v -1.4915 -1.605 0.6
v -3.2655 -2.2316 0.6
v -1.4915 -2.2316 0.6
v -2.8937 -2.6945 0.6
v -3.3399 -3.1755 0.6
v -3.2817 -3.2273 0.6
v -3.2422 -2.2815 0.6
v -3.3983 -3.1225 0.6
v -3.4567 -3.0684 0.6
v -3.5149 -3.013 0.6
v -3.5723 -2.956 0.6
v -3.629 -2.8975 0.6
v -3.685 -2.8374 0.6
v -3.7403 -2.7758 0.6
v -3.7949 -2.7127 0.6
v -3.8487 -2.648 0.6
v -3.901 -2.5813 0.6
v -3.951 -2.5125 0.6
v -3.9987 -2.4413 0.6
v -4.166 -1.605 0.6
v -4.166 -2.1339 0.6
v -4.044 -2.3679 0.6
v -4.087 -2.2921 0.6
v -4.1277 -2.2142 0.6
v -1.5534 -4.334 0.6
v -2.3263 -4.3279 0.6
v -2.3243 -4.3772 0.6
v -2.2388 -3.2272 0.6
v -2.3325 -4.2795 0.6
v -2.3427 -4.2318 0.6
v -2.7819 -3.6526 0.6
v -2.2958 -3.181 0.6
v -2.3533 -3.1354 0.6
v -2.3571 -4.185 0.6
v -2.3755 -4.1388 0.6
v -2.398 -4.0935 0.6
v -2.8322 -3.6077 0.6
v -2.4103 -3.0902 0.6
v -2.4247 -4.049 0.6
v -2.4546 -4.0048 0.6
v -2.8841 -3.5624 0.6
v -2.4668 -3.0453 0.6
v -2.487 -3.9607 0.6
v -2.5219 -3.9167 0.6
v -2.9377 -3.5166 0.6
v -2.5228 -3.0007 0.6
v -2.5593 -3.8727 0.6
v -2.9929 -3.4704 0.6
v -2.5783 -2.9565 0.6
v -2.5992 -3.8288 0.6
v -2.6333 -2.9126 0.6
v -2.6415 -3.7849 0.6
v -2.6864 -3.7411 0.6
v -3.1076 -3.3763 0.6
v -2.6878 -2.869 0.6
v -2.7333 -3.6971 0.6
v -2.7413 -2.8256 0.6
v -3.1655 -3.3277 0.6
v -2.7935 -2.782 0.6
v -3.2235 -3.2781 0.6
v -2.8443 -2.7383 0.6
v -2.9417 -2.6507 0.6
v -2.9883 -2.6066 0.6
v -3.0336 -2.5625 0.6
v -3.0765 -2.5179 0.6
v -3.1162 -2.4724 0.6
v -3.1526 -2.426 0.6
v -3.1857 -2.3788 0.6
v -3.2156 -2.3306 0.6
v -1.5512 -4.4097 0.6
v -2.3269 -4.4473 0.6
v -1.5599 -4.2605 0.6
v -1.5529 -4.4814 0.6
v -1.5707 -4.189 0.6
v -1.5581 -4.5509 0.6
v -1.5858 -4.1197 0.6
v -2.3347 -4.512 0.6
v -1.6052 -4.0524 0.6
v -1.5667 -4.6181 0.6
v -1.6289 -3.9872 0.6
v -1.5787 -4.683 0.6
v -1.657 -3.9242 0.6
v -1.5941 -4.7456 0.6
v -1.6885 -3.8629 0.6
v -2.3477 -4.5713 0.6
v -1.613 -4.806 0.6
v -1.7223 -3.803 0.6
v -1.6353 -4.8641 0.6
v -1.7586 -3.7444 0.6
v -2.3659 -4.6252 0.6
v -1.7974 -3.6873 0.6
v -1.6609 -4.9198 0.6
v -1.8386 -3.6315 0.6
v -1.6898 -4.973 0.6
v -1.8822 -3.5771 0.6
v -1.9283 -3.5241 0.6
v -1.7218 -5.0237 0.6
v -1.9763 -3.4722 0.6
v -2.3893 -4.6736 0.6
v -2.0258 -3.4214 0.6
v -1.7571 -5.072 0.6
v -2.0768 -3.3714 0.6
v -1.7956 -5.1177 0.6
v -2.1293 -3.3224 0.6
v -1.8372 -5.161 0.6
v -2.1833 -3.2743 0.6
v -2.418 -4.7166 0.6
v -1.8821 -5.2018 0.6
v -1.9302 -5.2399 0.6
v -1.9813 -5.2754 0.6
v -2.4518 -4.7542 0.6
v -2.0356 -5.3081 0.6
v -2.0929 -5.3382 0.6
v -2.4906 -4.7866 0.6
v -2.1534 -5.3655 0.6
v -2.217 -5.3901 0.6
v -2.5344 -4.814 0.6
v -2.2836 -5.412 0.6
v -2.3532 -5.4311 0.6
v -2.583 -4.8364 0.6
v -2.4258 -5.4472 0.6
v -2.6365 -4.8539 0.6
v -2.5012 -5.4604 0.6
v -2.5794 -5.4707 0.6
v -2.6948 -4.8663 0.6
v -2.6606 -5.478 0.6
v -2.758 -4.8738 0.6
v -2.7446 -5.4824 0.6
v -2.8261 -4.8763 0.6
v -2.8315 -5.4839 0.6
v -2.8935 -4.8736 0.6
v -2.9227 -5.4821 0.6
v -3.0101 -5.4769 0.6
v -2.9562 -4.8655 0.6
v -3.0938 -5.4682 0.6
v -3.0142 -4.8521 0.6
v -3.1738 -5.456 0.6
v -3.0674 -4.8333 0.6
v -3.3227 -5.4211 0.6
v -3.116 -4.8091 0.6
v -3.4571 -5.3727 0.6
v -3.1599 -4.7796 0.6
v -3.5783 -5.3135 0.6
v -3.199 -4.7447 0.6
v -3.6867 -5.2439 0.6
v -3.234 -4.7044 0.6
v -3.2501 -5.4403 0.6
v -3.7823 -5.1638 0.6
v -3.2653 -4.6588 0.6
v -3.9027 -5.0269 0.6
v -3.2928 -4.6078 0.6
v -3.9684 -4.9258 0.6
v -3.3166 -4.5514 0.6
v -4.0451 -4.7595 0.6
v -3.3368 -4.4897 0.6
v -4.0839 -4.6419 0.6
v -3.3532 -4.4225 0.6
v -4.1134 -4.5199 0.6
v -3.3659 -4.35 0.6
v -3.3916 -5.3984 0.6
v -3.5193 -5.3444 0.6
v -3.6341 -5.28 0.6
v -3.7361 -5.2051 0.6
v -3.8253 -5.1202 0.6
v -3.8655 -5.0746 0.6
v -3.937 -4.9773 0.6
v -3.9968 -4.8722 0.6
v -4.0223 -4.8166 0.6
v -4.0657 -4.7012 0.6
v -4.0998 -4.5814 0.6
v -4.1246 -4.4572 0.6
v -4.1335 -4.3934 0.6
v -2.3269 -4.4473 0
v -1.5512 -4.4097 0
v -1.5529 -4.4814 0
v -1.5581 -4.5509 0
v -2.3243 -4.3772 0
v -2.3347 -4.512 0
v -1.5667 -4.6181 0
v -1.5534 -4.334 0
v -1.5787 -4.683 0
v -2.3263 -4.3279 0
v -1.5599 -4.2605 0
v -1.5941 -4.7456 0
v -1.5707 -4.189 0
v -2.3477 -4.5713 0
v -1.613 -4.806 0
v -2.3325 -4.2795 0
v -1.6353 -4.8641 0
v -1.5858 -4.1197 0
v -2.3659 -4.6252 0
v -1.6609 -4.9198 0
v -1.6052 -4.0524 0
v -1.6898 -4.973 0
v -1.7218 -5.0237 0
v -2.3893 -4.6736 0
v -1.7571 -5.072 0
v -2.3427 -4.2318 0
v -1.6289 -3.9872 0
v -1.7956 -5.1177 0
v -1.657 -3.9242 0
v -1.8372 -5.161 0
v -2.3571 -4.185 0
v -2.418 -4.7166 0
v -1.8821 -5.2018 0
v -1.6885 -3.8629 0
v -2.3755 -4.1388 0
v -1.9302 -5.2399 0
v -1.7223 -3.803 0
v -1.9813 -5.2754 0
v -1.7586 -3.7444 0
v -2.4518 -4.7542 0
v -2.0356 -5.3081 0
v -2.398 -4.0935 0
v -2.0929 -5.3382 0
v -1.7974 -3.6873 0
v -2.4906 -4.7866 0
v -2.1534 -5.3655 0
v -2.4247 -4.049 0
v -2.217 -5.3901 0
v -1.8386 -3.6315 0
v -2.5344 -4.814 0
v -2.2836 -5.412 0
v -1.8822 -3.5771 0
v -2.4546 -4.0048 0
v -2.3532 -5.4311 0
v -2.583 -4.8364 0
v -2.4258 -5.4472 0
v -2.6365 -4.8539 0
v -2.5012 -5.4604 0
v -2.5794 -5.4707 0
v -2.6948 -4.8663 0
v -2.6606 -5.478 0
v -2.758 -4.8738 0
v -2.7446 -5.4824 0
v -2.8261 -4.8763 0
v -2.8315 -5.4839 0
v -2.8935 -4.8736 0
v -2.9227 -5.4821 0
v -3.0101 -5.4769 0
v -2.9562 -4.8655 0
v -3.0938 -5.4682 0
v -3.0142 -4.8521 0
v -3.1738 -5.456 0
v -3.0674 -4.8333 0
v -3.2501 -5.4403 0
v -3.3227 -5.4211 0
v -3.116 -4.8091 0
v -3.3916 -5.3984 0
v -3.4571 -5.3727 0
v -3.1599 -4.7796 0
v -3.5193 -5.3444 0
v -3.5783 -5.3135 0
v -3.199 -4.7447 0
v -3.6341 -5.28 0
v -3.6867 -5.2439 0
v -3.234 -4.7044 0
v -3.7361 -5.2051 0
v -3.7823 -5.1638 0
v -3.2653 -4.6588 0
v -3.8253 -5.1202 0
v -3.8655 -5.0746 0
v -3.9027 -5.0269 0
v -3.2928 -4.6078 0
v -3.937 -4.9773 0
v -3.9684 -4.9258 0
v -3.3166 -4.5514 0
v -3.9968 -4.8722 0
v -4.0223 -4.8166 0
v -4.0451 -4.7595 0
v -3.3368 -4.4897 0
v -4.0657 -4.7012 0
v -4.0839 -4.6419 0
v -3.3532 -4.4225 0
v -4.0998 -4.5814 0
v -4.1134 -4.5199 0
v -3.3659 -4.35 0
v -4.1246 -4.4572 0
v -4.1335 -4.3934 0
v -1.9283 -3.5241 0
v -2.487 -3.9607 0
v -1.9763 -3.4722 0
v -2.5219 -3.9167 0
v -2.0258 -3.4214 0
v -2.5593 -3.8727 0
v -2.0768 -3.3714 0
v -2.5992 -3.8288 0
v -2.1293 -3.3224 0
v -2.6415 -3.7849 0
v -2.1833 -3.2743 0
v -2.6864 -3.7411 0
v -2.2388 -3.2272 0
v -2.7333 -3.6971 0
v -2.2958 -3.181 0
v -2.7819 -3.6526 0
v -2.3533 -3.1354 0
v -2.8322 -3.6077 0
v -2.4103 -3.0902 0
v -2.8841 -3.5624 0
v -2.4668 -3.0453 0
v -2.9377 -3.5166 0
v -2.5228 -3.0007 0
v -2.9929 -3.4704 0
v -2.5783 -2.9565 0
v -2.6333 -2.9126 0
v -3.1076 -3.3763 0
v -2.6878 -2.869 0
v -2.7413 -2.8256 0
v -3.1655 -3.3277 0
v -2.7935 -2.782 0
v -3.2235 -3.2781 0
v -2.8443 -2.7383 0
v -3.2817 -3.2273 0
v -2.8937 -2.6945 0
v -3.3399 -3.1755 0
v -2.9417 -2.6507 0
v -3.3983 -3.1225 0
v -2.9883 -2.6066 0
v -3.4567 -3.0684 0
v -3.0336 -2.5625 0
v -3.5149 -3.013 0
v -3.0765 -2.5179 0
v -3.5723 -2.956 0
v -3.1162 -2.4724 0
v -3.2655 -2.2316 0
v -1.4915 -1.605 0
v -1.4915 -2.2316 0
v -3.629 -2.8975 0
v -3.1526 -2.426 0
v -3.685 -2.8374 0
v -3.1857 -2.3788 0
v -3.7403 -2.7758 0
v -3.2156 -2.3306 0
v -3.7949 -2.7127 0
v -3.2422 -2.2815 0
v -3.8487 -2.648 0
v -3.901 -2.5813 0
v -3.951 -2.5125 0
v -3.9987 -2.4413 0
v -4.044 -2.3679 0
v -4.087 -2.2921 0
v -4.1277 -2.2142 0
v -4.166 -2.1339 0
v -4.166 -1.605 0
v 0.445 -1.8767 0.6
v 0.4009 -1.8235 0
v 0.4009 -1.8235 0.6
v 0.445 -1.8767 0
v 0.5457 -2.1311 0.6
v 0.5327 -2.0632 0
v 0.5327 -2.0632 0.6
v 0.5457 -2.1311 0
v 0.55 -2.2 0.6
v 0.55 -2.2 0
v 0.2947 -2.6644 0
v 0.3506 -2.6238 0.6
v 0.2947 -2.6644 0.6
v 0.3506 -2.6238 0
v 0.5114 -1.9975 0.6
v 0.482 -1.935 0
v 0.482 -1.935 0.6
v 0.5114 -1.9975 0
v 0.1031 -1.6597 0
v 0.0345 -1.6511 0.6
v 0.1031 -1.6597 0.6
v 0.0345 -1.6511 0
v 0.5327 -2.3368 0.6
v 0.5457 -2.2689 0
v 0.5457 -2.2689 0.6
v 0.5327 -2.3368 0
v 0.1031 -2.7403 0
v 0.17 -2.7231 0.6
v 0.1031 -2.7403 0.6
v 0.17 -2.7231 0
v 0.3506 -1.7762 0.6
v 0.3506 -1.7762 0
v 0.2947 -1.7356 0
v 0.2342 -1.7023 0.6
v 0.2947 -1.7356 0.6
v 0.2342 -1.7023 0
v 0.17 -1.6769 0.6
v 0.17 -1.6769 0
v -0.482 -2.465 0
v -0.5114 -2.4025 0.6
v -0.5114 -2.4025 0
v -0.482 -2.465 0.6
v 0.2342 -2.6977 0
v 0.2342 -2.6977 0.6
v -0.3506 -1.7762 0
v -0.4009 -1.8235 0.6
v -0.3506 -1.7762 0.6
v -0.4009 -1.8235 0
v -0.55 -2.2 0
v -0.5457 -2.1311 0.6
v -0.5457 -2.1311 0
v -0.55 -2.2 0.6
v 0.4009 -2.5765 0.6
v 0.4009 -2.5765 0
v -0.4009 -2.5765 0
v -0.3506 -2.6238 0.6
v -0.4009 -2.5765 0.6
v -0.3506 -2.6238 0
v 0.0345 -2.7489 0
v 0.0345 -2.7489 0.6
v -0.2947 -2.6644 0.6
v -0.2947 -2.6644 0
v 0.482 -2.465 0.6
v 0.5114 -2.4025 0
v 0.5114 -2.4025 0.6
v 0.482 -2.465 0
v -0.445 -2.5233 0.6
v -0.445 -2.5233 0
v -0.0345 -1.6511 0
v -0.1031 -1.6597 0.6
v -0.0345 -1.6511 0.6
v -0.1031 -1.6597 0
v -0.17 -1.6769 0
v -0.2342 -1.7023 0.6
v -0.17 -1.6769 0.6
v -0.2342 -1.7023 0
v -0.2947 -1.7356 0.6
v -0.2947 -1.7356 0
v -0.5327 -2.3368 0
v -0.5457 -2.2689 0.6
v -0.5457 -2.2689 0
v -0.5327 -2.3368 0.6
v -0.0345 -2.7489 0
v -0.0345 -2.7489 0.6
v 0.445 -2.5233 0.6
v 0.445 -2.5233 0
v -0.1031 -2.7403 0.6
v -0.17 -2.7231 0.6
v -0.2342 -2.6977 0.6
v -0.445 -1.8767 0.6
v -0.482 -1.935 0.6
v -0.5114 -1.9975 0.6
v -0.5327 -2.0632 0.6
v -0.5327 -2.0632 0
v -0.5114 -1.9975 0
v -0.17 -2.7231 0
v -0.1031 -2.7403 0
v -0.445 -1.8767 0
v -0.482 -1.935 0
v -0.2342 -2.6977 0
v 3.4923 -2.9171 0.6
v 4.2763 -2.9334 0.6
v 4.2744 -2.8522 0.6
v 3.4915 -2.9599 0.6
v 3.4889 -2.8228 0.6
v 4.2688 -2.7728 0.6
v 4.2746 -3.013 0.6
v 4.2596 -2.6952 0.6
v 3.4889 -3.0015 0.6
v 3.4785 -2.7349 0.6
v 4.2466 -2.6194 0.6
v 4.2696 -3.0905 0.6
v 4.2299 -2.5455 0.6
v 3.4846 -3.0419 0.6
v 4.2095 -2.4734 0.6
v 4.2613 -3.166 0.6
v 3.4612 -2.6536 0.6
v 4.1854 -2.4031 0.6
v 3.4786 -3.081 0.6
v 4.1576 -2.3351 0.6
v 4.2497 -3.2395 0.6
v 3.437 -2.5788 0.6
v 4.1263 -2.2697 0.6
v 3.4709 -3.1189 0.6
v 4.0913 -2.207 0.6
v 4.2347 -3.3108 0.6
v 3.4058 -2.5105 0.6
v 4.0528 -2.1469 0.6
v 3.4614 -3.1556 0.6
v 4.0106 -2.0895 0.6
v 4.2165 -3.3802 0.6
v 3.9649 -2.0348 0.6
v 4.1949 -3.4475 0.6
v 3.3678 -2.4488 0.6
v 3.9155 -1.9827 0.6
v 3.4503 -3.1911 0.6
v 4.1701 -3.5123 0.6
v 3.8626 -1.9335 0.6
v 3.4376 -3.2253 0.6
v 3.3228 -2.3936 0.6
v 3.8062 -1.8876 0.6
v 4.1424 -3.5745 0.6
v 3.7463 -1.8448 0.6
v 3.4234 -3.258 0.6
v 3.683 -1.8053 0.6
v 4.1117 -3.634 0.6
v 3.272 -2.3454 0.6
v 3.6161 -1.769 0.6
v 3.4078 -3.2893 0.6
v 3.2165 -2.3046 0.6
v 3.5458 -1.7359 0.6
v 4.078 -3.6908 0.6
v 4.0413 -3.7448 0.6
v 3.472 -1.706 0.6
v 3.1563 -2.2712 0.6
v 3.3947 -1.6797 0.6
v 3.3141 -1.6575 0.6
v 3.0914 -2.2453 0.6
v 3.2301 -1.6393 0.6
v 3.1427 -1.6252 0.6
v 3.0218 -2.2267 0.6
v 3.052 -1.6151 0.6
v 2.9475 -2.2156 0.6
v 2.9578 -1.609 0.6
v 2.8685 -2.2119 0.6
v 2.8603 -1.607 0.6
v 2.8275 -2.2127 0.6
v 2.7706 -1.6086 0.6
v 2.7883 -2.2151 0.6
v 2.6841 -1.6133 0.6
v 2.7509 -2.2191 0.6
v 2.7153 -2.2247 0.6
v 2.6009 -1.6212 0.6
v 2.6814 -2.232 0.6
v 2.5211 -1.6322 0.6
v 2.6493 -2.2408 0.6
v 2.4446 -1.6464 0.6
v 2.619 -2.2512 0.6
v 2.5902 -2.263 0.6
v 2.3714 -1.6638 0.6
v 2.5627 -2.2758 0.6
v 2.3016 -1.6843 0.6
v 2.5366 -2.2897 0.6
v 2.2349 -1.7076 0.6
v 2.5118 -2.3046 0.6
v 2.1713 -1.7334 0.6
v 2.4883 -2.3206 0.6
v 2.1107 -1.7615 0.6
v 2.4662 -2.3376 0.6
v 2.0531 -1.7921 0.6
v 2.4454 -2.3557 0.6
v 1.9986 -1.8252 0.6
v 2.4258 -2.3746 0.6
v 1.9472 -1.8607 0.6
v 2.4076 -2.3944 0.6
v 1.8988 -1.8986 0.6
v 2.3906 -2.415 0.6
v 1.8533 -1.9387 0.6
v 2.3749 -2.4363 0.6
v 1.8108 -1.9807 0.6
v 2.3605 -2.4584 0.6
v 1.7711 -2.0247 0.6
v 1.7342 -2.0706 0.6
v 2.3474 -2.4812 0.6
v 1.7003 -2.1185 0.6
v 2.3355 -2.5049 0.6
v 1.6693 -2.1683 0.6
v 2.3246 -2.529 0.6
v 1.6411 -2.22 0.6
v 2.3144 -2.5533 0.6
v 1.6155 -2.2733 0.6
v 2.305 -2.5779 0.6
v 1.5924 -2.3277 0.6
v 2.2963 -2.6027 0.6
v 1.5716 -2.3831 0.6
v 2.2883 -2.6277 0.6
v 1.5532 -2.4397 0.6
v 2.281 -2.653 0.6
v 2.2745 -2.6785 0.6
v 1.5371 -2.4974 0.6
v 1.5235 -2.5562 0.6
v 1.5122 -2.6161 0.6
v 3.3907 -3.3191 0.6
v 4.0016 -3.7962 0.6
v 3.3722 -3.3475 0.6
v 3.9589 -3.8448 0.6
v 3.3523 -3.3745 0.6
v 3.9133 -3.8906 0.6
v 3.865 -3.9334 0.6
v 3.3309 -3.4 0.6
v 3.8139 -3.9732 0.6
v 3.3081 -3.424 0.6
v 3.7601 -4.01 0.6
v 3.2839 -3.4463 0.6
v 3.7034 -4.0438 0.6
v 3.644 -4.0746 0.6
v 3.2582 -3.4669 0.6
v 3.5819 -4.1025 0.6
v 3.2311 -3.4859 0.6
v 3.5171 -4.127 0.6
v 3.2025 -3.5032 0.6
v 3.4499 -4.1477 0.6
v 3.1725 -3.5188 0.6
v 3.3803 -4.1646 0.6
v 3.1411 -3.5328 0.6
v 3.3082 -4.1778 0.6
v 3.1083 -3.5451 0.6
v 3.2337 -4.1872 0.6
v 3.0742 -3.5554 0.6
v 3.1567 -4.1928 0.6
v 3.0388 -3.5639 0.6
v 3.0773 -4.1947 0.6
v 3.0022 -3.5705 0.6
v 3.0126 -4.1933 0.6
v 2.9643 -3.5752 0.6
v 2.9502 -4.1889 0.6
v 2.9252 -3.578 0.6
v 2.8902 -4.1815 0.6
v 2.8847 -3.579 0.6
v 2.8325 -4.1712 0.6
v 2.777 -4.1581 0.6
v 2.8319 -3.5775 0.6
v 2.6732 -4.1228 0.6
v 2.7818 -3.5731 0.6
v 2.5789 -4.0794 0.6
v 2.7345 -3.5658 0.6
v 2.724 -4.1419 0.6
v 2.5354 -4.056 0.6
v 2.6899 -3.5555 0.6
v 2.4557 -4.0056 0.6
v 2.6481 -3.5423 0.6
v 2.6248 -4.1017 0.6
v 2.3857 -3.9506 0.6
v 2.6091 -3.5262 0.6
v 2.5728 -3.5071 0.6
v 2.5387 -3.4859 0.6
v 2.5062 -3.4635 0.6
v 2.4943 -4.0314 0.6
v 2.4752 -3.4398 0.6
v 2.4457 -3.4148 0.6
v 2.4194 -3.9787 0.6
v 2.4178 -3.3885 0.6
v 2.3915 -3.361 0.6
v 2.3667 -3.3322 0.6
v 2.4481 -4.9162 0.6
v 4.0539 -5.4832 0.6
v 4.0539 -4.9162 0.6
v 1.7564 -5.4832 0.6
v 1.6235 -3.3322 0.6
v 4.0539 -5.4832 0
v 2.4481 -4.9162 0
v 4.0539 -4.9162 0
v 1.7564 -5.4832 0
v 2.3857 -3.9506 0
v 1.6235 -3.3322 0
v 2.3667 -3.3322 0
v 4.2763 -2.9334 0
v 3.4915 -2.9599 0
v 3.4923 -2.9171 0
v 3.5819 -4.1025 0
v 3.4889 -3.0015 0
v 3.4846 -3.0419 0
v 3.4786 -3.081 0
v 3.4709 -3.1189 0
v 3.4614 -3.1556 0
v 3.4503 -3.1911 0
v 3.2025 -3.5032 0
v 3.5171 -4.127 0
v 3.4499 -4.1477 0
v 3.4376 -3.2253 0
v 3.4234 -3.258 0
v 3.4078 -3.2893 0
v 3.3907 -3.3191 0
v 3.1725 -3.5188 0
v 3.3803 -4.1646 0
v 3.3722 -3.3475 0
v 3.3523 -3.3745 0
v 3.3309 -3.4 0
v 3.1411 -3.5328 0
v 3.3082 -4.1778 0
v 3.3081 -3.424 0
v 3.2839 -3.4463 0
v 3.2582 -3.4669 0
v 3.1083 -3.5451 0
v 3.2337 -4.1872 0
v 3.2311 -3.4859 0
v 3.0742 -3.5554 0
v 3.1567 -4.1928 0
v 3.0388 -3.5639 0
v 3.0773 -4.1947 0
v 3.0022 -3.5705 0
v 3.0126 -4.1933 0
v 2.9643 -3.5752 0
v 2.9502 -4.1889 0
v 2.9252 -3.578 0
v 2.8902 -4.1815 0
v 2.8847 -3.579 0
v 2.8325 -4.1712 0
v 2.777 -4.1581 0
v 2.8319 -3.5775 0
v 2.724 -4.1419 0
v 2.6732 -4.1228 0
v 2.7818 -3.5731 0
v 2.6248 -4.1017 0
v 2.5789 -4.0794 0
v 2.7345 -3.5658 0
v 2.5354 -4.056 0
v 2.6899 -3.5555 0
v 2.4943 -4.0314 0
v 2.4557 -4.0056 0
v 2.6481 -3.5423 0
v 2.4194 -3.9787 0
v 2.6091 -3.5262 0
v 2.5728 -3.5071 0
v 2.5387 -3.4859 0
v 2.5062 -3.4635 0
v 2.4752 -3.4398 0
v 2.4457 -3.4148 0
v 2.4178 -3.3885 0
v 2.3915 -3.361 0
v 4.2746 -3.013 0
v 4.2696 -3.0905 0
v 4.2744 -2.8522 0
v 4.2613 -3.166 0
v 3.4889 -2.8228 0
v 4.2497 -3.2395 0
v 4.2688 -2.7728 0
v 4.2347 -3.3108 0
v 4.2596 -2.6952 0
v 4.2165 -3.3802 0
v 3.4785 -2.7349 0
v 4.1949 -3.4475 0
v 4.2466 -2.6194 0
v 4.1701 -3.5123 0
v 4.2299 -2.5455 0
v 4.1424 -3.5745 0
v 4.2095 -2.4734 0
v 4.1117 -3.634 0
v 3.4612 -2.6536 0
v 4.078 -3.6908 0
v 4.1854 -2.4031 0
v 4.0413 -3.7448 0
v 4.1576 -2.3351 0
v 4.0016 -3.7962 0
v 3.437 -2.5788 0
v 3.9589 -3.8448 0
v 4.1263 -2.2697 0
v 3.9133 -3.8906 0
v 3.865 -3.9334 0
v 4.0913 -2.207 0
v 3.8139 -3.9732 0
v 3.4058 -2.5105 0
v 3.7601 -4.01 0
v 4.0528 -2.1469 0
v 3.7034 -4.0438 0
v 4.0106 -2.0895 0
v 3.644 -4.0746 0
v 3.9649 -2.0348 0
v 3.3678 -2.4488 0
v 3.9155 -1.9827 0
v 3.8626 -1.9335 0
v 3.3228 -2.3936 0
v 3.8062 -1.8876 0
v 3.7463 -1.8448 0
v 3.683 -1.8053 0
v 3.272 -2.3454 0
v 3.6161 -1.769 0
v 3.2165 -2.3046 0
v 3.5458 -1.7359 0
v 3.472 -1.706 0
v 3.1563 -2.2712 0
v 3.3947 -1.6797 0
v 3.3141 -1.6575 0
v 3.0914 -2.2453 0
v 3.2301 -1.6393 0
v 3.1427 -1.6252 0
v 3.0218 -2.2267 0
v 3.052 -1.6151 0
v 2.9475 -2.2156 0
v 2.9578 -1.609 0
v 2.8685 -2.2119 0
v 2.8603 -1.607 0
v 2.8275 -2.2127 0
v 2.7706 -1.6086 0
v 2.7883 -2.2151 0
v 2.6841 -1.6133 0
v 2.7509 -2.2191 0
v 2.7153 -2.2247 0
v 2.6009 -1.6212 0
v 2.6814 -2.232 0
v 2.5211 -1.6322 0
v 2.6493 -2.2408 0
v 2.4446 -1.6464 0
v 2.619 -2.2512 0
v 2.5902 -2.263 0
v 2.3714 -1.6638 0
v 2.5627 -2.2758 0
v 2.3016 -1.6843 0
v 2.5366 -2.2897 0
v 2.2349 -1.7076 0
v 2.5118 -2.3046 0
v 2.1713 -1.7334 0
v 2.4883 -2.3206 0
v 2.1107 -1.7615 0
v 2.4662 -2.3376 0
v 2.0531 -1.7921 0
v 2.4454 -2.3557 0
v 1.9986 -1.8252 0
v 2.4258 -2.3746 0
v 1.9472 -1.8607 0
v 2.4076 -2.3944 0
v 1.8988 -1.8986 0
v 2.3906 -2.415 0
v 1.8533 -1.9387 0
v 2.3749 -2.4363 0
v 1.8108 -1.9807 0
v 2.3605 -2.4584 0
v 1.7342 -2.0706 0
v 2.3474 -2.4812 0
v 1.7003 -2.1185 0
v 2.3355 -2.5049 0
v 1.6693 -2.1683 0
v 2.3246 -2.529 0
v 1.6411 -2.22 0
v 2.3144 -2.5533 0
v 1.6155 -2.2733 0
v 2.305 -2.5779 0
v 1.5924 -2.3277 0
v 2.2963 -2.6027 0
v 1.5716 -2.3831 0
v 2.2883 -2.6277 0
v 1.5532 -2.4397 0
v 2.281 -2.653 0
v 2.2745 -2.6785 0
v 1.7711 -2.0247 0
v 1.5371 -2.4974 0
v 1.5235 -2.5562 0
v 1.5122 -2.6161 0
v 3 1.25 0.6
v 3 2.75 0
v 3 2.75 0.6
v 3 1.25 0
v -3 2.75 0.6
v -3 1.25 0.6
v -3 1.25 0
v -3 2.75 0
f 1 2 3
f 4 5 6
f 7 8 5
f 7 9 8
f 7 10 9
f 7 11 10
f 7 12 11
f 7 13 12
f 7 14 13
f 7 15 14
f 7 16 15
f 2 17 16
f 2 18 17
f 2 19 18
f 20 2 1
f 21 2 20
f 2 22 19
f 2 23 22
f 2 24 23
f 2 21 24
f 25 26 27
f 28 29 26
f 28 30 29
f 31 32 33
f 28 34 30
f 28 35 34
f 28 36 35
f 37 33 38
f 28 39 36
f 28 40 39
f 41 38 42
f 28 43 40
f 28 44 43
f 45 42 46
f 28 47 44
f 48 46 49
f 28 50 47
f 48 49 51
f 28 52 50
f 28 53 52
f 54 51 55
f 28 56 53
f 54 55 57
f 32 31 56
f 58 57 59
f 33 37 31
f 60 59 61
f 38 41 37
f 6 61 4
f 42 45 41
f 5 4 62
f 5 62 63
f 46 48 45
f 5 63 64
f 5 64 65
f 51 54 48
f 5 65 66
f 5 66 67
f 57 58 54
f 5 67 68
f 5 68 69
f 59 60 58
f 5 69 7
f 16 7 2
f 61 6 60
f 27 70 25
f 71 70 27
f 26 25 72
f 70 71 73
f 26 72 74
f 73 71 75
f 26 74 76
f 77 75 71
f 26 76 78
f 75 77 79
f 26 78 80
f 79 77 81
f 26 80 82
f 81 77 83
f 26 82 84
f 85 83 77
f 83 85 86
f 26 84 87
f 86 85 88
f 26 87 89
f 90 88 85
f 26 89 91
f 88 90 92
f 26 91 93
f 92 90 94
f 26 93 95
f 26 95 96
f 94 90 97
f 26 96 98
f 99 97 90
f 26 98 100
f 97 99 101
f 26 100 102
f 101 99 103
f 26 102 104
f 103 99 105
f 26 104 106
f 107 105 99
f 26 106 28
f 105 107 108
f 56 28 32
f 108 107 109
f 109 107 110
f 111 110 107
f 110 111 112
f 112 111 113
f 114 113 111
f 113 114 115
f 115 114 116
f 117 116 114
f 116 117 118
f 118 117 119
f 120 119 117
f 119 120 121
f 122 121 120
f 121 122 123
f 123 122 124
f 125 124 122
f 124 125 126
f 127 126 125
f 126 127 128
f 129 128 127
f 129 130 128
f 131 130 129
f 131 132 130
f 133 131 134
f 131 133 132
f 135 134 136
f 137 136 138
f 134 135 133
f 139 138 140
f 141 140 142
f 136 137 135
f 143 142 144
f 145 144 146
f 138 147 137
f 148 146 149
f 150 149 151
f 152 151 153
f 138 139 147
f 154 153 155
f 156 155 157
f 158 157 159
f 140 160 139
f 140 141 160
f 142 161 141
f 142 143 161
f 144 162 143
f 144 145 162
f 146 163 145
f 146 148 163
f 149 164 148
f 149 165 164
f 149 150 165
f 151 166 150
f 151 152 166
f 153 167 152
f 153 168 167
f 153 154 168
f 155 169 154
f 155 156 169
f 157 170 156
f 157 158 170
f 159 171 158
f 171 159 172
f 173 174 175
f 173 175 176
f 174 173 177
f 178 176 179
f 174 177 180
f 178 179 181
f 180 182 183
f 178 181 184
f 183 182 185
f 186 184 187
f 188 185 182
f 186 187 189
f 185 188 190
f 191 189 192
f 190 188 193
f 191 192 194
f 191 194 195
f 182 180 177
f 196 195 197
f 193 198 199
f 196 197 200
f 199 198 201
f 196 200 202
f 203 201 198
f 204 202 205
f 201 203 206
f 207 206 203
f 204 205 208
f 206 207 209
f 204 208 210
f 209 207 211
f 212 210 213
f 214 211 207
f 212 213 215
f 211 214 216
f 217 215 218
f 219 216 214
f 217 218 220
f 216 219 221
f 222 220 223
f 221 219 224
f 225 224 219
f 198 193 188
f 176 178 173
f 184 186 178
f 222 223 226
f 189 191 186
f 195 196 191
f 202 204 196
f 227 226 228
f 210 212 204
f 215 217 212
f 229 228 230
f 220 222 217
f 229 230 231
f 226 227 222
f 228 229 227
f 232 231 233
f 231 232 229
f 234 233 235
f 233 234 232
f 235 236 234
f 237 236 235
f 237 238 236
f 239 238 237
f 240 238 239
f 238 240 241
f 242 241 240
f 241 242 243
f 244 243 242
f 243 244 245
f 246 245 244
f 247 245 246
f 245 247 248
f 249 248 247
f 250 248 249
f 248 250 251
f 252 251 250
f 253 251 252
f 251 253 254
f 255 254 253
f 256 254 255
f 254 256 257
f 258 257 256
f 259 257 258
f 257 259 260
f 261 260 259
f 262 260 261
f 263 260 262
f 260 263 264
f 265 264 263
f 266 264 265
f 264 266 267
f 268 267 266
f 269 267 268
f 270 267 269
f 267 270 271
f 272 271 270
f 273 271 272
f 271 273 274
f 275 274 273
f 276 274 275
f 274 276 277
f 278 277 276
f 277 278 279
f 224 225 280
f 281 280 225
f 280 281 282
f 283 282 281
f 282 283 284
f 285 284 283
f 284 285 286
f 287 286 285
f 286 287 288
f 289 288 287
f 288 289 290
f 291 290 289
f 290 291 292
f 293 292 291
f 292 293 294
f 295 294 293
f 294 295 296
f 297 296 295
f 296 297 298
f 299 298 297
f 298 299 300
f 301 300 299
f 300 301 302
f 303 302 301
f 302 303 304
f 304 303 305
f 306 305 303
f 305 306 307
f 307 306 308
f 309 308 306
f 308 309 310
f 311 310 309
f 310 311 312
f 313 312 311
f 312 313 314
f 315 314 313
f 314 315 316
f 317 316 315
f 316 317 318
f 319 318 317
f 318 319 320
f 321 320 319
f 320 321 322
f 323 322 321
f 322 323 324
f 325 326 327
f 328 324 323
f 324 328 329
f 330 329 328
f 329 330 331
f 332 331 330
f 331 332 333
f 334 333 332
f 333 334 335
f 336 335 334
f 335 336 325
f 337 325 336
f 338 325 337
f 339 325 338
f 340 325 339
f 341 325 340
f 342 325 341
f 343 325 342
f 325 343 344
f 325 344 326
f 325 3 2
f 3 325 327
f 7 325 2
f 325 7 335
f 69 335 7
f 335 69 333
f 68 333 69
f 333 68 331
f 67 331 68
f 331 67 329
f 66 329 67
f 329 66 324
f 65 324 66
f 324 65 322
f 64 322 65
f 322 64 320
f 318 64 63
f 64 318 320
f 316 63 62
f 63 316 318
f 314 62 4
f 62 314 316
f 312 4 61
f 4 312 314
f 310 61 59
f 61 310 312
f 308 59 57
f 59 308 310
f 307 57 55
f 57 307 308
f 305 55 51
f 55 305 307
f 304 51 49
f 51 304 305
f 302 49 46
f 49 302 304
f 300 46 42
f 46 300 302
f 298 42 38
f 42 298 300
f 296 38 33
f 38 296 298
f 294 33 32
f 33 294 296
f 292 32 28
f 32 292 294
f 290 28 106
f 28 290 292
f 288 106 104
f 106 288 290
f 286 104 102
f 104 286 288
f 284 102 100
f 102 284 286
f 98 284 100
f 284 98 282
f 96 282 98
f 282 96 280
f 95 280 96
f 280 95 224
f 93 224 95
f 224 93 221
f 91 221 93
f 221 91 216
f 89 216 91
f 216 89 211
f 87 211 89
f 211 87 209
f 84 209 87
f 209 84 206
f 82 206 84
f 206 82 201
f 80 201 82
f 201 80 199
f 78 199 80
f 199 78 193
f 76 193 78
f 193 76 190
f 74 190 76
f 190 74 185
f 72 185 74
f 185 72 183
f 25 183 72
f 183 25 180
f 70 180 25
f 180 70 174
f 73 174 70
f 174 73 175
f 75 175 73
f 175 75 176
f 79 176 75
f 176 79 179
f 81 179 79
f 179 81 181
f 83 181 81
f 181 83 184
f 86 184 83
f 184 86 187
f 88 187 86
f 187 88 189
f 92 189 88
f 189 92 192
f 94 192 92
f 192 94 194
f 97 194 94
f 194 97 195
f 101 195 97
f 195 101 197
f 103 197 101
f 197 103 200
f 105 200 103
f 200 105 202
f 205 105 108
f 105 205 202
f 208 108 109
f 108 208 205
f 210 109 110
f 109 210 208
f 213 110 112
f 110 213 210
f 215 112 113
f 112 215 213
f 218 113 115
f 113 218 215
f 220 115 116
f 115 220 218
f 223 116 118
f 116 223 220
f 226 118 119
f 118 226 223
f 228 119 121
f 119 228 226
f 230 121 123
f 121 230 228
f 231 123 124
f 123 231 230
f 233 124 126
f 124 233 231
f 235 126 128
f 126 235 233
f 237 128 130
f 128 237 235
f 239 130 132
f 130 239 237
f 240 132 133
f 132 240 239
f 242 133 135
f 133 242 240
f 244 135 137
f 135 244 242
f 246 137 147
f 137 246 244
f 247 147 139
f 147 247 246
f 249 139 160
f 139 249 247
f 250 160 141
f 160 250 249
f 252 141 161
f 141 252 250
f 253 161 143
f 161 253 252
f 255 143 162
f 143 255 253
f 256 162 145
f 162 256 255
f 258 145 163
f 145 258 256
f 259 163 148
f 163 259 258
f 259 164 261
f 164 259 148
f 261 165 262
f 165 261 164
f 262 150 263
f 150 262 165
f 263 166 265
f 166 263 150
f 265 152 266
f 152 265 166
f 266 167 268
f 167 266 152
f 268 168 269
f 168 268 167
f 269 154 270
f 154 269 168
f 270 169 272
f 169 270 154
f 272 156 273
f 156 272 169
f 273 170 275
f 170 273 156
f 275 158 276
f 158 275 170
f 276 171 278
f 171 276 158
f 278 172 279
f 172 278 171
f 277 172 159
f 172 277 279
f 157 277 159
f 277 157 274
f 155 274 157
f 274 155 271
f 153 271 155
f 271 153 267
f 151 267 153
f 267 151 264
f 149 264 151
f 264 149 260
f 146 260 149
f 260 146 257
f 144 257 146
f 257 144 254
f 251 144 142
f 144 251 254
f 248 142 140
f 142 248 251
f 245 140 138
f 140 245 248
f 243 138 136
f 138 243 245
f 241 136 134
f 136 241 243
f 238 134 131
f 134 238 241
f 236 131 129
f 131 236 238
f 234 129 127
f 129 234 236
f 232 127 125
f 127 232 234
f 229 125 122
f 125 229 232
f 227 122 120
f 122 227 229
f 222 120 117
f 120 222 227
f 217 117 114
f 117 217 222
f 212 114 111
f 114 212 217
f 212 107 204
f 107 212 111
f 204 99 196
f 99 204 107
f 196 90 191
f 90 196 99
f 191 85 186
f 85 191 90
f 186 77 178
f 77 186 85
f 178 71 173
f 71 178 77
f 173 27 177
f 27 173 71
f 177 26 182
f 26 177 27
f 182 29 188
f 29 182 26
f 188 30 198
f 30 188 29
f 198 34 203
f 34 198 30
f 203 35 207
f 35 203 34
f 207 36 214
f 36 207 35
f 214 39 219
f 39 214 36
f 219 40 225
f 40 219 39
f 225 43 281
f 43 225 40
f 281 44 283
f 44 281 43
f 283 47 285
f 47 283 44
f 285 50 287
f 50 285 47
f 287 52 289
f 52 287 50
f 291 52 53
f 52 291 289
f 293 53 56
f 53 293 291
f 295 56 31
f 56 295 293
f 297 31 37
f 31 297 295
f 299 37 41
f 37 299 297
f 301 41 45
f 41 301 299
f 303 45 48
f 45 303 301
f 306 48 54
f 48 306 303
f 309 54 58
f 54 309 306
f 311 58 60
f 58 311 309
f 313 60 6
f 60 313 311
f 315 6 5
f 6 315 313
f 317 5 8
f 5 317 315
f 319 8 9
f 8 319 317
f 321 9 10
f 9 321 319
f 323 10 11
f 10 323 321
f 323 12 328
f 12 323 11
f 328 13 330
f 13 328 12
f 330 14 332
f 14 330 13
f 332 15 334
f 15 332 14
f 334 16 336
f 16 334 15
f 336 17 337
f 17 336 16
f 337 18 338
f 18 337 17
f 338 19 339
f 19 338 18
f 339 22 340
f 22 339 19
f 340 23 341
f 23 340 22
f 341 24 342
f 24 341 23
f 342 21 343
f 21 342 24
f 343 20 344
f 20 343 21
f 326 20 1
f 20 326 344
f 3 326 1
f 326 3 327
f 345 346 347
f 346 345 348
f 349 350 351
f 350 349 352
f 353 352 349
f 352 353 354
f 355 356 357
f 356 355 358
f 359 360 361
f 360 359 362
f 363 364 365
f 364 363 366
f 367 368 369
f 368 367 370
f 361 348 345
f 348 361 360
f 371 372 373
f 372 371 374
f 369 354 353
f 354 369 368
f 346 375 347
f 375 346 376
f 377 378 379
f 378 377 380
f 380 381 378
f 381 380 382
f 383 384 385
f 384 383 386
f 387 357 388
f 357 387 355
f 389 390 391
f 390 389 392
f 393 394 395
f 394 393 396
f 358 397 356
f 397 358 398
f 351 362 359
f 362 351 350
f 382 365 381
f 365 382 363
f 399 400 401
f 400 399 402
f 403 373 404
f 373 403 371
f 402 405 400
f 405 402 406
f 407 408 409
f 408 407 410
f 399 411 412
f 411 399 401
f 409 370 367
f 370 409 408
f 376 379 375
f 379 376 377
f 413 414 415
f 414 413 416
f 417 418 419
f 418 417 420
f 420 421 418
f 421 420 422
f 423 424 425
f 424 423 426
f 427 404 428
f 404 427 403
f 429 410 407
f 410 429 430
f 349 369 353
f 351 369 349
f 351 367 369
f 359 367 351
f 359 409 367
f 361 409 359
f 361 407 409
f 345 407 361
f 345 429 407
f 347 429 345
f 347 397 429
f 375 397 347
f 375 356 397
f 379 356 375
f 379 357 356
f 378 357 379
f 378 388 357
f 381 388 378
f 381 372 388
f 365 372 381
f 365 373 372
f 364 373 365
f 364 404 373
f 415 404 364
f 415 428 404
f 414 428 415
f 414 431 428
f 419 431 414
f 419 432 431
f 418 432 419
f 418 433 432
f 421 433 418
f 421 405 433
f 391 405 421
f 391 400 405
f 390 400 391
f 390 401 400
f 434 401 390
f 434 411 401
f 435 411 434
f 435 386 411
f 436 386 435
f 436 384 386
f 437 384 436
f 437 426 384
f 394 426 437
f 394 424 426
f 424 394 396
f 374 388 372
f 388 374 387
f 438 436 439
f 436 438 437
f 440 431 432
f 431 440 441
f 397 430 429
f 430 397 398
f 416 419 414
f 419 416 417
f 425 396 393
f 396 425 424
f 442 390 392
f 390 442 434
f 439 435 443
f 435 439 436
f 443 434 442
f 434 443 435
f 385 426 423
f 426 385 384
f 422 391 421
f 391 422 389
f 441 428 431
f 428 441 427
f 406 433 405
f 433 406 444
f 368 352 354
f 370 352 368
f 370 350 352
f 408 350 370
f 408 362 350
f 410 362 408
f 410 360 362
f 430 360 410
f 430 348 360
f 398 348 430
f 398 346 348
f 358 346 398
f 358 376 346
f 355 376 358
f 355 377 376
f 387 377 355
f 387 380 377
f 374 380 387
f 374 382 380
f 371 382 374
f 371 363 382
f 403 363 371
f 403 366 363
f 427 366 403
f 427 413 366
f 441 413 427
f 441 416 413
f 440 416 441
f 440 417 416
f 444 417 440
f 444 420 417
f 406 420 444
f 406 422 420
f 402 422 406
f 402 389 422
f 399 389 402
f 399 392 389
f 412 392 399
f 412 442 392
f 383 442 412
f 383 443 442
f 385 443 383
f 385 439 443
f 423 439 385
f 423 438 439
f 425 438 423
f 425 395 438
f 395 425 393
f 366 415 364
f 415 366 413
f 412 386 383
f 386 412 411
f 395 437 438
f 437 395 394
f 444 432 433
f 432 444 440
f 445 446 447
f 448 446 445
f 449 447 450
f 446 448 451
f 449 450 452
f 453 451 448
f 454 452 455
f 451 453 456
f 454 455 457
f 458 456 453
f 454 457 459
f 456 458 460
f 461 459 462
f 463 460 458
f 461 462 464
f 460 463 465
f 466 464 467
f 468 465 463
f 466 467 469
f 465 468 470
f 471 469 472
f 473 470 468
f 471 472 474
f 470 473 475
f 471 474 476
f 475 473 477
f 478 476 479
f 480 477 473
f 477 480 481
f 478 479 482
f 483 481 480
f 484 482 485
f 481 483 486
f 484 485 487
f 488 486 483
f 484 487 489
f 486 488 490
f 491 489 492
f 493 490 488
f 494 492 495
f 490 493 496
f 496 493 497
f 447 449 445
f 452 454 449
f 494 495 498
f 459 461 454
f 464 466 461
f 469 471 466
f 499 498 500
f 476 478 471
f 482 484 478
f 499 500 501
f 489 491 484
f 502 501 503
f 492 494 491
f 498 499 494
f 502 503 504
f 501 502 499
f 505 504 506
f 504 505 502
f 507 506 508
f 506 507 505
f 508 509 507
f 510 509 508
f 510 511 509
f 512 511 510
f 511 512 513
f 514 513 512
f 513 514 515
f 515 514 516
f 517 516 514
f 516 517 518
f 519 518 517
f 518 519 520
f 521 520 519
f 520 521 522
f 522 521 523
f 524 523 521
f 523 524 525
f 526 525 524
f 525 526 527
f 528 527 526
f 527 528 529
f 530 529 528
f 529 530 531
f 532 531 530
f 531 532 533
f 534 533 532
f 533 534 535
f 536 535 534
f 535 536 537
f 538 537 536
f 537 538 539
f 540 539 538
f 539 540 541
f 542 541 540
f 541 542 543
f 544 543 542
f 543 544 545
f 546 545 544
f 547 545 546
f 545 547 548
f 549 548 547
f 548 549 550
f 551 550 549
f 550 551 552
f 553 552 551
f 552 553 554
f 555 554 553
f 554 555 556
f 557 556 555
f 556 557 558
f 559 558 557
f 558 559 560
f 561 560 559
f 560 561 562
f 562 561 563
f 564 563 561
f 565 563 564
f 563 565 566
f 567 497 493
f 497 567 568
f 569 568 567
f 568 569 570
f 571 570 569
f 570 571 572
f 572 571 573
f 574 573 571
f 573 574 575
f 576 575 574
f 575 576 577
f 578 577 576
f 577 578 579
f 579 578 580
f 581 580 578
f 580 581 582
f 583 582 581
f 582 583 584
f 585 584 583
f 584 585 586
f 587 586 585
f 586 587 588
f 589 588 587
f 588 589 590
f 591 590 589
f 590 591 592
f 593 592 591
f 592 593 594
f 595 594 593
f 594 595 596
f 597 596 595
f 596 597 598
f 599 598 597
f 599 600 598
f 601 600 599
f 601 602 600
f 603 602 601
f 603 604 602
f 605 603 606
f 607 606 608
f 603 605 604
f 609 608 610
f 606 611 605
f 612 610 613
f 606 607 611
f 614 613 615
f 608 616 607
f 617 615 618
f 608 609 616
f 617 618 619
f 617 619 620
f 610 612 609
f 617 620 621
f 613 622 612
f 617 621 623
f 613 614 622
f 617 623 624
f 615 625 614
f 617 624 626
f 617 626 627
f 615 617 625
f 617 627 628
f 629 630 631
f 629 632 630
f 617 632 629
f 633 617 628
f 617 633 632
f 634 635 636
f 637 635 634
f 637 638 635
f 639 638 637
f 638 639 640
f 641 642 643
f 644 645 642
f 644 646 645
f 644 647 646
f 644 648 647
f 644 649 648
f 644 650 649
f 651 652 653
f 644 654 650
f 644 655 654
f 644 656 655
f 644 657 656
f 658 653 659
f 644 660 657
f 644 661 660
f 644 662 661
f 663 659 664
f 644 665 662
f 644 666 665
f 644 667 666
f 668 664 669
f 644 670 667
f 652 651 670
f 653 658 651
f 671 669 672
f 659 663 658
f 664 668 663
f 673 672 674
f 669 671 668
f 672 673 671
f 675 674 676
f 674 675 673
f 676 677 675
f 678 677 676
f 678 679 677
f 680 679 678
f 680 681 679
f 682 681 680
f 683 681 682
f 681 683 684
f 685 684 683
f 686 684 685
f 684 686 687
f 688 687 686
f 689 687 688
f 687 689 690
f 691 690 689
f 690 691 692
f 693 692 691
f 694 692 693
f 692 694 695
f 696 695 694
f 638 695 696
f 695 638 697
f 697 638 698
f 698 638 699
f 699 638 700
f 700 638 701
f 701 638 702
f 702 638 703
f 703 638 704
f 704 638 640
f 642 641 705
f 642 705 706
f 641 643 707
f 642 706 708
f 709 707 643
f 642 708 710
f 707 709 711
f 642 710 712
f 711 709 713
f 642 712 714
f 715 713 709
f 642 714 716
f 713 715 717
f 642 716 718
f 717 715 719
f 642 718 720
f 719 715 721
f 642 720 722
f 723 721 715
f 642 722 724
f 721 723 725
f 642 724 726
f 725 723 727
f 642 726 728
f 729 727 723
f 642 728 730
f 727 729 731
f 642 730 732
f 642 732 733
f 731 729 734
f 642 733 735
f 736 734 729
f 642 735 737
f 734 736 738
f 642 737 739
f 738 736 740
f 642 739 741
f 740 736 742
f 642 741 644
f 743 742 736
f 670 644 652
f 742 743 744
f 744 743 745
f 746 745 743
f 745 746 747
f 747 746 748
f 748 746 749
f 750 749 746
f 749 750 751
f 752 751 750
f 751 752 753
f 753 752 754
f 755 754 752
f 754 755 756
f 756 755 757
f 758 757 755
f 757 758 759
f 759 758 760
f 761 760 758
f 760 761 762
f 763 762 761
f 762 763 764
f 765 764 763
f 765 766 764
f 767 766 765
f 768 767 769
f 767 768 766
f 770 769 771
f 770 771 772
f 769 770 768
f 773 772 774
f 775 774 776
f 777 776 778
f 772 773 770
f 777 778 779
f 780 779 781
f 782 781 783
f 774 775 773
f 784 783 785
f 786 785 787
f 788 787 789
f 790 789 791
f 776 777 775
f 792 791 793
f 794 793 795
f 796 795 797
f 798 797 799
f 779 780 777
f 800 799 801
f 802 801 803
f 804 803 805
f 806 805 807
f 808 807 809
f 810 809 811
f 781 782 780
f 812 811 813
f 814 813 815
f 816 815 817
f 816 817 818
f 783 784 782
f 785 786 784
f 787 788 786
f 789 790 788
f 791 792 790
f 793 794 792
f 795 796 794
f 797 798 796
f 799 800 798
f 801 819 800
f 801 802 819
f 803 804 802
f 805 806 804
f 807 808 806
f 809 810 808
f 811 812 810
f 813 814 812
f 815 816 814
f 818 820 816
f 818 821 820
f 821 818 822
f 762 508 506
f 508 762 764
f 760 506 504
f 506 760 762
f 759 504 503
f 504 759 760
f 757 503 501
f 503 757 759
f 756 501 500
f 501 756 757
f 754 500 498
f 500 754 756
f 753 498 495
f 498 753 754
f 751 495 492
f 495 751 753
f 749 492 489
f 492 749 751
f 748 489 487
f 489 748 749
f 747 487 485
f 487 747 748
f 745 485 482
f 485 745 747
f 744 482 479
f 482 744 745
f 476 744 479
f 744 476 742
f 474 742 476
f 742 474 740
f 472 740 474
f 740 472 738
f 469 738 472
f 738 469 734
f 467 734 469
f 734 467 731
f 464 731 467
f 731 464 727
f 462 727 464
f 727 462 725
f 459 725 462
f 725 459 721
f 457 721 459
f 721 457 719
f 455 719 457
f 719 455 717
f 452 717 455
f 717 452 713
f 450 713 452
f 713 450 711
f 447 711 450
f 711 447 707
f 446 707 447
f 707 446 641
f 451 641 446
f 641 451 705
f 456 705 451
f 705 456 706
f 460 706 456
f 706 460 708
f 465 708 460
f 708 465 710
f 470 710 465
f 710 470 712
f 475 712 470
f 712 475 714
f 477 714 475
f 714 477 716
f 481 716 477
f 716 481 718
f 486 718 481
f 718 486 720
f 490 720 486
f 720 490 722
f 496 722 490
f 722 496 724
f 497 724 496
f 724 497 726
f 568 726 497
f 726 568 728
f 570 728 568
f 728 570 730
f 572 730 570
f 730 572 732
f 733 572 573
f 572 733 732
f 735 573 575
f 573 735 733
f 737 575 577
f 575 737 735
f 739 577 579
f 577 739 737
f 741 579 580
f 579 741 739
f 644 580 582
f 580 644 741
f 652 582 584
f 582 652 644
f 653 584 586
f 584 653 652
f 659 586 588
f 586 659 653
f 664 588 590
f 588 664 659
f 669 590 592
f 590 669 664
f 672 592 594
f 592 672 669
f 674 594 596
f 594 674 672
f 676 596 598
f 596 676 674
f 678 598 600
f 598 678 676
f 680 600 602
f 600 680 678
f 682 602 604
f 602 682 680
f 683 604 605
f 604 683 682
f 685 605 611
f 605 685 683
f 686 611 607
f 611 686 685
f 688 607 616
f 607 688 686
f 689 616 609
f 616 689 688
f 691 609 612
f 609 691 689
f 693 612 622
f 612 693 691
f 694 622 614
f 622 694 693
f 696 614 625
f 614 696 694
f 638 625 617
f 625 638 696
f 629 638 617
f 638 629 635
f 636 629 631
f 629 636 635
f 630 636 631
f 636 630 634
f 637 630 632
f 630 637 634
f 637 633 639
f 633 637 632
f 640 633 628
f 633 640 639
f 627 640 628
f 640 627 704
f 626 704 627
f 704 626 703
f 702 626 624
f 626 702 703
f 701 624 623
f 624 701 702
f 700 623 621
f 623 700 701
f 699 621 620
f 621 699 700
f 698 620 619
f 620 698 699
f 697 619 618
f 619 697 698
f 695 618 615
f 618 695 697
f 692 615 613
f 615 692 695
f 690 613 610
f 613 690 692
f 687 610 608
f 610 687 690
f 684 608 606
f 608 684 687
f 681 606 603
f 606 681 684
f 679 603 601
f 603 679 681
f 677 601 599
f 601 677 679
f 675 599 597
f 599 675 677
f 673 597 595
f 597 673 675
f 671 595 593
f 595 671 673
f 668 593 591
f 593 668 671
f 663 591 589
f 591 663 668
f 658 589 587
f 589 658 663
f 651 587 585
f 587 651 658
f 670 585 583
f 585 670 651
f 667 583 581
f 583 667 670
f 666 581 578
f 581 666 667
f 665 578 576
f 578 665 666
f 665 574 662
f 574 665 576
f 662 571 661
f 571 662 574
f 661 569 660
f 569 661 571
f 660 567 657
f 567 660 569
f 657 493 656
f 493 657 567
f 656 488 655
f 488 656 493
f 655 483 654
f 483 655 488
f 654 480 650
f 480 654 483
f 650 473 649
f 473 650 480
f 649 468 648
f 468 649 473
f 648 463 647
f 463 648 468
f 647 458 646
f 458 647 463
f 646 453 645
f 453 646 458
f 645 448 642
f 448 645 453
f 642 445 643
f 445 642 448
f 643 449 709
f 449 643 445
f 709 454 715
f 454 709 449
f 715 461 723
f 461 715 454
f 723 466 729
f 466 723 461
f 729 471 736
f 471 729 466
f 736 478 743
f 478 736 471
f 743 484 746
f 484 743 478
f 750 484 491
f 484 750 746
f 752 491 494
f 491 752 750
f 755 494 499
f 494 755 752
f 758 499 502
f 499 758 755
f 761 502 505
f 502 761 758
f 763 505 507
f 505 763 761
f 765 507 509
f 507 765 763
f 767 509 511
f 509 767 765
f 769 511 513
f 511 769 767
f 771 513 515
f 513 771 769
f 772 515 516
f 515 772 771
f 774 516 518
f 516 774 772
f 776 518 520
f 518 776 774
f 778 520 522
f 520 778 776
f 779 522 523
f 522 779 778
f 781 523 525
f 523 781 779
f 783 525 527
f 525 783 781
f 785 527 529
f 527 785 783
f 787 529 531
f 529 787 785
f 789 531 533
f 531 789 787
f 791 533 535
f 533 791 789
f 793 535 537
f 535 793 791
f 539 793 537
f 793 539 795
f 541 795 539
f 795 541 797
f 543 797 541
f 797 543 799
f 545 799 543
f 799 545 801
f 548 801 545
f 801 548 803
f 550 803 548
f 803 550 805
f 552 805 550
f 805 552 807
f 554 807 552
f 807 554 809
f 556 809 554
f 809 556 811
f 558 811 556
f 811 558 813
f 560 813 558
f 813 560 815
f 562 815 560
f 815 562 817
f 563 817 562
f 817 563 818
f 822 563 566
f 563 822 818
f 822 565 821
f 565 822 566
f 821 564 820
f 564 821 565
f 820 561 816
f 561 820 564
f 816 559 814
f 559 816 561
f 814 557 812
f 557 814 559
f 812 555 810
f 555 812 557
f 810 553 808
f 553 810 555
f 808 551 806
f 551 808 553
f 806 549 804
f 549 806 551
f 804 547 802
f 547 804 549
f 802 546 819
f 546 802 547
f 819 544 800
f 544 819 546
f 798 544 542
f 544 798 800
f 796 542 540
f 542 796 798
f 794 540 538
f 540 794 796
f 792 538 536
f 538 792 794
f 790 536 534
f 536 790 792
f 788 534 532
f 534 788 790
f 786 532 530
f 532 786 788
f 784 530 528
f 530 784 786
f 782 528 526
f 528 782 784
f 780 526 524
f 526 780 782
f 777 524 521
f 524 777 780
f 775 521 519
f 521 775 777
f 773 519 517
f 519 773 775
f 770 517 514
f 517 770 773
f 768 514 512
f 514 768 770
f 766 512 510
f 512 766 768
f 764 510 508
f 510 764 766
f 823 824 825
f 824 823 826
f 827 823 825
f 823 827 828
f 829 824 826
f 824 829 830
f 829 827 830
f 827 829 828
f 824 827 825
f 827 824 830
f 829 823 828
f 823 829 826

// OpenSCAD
$fn = 50;

difference() {
	union() {
		translate(v = [-2.85, -3.5, 0.6]) {
			rotate(a = [180, 0, 0]) {
				linear_extrude(height = 0.6) {
					text(font = "Liberation Sans:style=Bold", halign = "center", size = 4.0, text = "2", valign = "center");
				}
			}
		}
		translate(v = [0.0, -2.2, 0.0]) {
			cylinder(h = 0.6, r = 0.55);
		}
		translate(v = [2.85, -3.5, 0.6]) {
			rotate(a = [180, 0, 0]) {
				linear_extrude(height = 0.6) {
					text(font = "Liberation Sans:style=Bold", halign = "center", size = 4.0, text = "5", valign = "center");
				}
			}
		}
		translate(v = [-3.0, 1.25, 0]) {
			cube(size = [6, 1.5, 0.6]);
		}
	}
	union();
}
